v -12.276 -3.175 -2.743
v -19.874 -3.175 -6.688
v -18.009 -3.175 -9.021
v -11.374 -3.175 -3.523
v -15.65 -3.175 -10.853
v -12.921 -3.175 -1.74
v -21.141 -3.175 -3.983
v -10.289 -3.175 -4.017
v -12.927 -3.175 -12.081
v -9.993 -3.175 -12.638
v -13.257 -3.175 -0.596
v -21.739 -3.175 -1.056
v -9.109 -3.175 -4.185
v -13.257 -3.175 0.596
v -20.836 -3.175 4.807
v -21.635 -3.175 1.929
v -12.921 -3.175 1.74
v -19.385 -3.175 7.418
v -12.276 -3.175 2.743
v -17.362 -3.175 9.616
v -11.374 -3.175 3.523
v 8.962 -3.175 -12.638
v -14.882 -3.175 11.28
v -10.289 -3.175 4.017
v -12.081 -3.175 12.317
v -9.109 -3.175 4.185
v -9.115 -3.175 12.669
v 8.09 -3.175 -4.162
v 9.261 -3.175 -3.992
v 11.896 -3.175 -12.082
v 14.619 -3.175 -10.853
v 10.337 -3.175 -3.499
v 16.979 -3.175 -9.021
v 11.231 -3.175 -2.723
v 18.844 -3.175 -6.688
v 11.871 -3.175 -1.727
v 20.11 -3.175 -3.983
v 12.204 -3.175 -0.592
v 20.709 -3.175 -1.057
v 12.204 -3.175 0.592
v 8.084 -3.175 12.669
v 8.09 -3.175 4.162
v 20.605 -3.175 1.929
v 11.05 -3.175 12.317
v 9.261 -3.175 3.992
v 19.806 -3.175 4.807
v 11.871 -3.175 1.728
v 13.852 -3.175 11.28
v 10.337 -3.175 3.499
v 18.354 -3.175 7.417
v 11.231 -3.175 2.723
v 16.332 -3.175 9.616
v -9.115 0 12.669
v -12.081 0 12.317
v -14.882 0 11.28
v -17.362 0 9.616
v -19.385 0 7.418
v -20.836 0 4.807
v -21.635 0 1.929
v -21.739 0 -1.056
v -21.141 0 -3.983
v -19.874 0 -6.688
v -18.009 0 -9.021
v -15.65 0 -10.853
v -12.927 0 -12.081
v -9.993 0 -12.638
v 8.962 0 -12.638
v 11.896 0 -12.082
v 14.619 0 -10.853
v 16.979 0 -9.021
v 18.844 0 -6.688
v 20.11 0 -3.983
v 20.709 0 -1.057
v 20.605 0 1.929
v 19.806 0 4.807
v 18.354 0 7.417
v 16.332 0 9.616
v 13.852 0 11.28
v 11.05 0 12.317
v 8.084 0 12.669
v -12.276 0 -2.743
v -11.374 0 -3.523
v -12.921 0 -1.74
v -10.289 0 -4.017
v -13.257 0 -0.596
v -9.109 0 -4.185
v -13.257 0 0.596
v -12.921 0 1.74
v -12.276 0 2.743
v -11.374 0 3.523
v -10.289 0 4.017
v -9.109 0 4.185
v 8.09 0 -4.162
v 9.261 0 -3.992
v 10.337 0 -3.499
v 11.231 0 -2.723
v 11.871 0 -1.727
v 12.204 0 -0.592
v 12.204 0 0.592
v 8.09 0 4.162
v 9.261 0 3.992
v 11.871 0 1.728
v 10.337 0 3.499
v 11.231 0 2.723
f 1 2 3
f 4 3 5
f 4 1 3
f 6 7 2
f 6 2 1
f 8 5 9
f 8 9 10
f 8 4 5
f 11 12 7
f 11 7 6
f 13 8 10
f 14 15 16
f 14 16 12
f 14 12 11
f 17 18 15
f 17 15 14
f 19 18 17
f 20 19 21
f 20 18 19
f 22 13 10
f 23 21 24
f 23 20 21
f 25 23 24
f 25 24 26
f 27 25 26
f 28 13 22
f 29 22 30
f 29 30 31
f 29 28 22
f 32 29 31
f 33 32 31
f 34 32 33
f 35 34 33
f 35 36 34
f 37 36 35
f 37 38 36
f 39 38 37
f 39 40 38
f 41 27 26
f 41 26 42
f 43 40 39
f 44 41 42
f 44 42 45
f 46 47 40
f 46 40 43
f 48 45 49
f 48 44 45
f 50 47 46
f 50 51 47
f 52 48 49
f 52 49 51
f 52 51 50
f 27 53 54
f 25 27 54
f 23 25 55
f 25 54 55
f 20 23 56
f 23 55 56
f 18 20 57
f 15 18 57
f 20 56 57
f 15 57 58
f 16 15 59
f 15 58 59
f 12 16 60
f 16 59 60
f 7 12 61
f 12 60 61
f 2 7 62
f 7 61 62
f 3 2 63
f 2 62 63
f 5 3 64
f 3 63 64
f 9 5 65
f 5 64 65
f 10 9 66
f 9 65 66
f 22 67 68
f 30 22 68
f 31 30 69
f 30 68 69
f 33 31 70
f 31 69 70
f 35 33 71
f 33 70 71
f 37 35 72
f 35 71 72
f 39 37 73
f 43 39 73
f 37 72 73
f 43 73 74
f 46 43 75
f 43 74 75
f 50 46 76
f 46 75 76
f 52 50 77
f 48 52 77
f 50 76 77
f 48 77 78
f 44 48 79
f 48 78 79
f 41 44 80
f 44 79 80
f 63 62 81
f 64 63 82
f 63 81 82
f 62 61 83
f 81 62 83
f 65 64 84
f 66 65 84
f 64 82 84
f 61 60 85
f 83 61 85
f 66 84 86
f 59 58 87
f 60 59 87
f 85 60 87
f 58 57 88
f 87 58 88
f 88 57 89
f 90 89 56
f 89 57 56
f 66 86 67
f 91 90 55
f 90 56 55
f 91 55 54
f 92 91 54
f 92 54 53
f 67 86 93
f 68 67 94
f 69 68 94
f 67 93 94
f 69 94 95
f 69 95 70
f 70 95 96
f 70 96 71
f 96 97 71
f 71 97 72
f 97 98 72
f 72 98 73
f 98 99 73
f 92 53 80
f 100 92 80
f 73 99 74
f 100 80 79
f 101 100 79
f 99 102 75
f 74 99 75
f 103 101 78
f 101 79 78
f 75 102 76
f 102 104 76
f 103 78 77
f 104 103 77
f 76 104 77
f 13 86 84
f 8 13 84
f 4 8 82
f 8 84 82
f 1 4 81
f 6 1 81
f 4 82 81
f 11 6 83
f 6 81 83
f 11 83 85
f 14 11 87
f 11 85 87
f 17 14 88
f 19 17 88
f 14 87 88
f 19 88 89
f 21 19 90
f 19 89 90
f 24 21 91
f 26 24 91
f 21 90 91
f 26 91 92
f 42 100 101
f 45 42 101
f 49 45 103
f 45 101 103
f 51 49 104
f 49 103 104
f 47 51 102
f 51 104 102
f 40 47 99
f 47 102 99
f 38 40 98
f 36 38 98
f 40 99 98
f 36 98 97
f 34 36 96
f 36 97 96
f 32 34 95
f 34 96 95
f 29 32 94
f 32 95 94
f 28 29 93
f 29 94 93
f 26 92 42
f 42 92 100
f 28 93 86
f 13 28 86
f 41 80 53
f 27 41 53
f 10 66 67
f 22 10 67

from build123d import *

# Parameters (mm, degrees)
F1_DEPTH = 3.175


with BuildPart() as f1:
    # F0 (on Front) → F1 (new body)
    with BuildSketch(Plane.XZ):
        with BuildLine():
            Line((-9.992783, -12.638227), (8.961562, -12.638227))
            ThreePointArc((8.961562, -12.638227), (20.74528, 0.439046), (8.084128, 12.668776))
            Line((8.084128, 12.668776), (-9.114507, 12.668711))
            ThreePointArc((-9.114507, 12.668711), (-21.775548, 0.439403), (-9.992783, -12.638227))
        make_face()
        with BuildLine():
            ThreePointArc((-9.108698, -4.185383), (-13.299846, -1.6e-05), (-9.108729, 4.185383))
            Line((-9.108729, 4.185383), (8.089874, 4.161838))
            ThreePointArc((8.089874, 4.161838), (12.245952, 8.1e-05), (8.089905, -4.161707))
            Line((8.089905, -4.161707), (-9.108698, -4.185383))
        make_face(mode=Mode.SUBTRACT)
    extrude(amount=F1_DEPTH)


solid = f1.part
